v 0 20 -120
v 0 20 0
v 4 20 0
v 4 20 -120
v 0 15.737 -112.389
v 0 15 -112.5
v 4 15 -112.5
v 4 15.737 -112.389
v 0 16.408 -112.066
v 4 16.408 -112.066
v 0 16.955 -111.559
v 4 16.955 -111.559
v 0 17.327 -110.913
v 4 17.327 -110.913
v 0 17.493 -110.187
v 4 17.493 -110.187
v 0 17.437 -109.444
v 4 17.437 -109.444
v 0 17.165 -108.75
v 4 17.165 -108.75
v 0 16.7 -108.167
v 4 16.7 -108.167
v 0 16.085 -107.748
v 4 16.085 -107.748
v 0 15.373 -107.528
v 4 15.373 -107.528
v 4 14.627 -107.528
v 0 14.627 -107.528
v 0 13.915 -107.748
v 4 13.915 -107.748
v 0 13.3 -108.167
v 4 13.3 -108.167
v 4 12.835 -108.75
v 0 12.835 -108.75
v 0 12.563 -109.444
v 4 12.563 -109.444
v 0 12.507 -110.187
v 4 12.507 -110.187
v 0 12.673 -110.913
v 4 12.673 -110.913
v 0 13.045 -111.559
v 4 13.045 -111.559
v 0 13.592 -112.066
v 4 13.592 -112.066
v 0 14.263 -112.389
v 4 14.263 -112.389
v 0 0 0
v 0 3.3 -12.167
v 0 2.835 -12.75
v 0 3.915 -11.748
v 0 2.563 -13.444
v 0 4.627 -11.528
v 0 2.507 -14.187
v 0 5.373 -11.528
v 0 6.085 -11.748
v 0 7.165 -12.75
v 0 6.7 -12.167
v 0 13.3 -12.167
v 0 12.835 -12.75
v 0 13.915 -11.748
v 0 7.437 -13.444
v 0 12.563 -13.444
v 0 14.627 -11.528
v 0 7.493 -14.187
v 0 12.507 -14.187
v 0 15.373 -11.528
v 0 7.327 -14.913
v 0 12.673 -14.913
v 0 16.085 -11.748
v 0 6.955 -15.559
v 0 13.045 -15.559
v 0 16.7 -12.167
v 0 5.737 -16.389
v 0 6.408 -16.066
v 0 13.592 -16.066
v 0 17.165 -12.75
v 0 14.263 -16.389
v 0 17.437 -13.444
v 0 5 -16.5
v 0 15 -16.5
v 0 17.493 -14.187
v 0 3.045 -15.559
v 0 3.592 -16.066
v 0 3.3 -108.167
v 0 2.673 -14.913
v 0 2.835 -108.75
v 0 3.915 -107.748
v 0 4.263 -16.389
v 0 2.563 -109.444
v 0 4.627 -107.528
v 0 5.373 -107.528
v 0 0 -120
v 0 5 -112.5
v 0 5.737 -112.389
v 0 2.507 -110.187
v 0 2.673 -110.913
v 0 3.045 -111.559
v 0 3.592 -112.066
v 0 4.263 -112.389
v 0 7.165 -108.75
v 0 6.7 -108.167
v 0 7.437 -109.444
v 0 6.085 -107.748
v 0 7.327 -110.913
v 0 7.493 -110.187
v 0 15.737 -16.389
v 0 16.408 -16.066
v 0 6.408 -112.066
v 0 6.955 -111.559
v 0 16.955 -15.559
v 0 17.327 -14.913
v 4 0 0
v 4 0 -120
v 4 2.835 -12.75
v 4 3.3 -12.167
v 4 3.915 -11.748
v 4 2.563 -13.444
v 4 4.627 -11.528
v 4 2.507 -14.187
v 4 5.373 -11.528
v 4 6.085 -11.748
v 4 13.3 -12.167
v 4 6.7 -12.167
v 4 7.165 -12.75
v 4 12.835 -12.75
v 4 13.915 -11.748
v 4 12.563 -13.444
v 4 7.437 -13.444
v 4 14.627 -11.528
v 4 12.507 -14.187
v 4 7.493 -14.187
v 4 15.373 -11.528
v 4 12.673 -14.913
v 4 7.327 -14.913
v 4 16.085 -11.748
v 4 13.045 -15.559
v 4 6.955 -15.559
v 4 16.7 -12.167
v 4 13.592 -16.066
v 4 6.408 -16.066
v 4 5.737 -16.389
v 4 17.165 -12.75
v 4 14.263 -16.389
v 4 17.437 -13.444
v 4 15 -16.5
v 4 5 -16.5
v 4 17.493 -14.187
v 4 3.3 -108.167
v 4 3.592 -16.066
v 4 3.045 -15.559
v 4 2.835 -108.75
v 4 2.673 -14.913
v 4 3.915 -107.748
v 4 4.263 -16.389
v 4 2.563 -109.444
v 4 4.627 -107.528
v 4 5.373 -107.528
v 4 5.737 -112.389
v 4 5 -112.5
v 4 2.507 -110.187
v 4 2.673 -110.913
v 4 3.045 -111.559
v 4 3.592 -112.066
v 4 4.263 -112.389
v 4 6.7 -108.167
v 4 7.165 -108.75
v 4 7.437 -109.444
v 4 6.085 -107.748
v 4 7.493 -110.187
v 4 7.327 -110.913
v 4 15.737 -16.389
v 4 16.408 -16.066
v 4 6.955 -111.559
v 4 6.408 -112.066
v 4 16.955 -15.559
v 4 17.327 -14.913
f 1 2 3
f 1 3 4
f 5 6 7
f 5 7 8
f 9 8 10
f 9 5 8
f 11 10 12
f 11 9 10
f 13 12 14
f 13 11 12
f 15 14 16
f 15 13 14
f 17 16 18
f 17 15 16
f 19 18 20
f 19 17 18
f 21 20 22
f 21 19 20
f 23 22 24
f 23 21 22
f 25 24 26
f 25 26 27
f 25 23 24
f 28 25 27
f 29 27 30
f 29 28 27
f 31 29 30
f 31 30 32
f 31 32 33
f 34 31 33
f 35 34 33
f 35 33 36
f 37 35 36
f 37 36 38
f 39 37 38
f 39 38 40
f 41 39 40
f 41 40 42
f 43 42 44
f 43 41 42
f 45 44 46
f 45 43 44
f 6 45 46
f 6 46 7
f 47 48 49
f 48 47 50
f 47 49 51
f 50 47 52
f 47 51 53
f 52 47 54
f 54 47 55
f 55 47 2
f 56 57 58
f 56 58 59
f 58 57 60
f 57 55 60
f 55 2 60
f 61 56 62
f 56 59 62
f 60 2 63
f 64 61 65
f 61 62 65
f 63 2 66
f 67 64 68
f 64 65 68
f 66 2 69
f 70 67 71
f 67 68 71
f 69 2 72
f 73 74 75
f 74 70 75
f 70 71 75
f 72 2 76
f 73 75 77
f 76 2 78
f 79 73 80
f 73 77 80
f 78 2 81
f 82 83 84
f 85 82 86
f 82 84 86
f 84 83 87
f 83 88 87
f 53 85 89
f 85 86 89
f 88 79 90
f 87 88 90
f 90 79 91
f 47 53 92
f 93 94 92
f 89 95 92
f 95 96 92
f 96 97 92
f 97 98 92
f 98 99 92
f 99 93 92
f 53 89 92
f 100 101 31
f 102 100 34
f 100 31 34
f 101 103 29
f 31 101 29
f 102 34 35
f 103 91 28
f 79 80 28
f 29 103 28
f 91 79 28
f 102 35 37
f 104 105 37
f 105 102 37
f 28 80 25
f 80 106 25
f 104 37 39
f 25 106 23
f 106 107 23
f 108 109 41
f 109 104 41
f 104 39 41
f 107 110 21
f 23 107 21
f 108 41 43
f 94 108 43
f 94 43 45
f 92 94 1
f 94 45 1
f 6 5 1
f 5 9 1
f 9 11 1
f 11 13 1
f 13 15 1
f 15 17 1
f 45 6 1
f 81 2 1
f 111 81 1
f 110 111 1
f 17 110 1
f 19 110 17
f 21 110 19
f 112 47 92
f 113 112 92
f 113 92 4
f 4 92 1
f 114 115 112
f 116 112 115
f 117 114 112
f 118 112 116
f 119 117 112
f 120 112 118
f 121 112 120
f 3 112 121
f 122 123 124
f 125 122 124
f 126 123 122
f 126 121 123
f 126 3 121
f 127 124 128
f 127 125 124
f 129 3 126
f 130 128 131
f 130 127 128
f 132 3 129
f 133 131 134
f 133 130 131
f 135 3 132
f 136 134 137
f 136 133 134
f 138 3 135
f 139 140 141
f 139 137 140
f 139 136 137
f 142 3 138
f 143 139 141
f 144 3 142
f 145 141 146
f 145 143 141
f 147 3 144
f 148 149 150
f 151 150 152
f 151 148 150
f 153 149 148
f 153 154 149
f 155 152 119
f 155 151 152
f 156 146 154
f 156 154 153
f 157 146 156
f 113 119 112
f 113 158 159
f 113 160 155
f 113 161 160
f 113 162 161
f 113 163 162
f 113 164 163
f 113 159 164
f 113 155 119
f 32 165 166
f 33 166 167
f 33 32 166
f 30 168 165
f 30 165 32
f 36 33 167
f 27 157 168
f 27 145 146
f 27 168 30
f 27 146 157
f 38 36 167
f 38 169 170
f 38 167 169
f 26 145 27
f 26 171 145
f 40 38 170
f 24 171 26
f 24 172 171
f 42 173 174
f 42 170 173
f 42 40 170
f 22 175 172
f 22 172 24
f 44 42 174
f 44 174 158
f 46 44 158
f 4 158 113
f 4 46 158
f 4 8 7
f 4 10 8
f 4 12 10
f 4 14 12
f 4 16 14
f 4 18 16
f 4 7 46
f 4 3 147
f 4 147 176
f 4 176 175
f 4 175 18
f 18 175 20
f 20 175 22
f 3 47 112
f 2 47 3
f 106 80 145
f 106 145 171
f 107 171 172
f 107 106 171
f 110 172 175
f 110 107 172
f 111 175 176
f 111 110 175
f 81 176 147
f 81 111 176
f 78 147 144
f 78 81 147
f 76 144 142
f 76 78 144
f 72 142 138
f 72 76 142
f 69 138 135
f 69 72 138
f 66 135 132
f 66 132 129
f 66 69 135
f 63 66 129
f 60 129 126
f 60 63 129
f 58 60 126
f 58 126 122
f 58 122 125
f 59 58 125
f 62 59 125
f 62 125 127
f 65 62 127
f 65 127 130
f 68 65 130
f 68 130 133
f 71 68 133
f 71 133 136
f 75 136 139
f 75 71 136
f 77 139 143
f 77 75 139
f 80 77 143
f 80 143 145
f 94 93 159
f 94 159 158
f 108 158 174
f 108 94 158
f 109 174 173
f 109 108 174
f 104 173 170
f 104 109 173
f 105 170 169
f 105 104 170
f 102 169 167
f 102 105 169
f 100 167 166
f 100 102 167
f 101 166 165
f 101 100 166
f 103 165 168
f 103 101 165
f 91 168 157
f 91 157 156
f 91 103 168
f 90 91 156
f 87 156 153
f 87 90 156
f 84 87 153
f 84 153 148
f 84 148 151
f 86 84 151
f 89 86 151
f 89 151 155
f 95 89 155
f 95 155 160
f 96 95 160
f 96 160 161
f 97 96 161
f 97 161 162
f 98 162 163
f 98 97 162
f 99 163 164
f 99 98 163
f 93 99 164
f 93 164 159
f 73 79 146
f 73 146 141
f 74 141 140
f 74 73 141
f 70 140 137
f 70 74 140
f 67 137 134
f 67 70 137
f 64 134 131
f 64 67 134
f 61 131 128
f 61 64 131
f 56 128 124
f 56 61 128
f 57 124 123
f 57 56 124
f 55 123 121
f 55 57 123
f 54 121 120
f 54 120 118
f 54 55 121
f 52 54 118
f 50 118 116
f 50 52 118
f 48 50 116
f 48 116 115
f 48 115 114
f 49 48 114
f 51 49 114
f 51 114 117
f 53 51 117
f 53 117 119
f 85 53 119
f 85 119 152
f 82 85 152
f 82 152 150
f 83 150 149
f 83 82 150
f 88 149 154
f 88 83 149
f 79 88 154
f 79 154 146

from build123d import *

# Parameters (mm, degrees)
SKETCH_1_W      = 120
SKETCH_1_H      = 20
SKETCH_1_R      = 2.5
EXTRUDE_1_DEPTH = 4


with BuildPart() as part:
    # Эскиз1 → Бобышка-Вытянуть1 (new body)
    with BuildSketch(Plane(origin=(0, 0, 0), x_dir=(0, 0, -1), z_dir=(1, 0, 0))):
        with Locations((60, 10)):
            Rectangle(SKETCH_1_W, SKETCH_1_H)
        with Locations((110, 15)):
            Circle(SKETCH_1_R, mode=Mode.SUBTRACT)
        with Locations((110, 5)):
            Circle(SKETCH_1_R, mode=Mode.SUBTRACT)
        with Locations((14, 15)):
            Circle(SKETCH_1_R, mode=Mode.SUBTRACT)
        with Locations((14, 5)):
            Circle(SKETCH_1_R, mode=Mode.SUBTRACT)
    extrude(amount=EXTRUDE_1_DEPTH)


solid = part.part
